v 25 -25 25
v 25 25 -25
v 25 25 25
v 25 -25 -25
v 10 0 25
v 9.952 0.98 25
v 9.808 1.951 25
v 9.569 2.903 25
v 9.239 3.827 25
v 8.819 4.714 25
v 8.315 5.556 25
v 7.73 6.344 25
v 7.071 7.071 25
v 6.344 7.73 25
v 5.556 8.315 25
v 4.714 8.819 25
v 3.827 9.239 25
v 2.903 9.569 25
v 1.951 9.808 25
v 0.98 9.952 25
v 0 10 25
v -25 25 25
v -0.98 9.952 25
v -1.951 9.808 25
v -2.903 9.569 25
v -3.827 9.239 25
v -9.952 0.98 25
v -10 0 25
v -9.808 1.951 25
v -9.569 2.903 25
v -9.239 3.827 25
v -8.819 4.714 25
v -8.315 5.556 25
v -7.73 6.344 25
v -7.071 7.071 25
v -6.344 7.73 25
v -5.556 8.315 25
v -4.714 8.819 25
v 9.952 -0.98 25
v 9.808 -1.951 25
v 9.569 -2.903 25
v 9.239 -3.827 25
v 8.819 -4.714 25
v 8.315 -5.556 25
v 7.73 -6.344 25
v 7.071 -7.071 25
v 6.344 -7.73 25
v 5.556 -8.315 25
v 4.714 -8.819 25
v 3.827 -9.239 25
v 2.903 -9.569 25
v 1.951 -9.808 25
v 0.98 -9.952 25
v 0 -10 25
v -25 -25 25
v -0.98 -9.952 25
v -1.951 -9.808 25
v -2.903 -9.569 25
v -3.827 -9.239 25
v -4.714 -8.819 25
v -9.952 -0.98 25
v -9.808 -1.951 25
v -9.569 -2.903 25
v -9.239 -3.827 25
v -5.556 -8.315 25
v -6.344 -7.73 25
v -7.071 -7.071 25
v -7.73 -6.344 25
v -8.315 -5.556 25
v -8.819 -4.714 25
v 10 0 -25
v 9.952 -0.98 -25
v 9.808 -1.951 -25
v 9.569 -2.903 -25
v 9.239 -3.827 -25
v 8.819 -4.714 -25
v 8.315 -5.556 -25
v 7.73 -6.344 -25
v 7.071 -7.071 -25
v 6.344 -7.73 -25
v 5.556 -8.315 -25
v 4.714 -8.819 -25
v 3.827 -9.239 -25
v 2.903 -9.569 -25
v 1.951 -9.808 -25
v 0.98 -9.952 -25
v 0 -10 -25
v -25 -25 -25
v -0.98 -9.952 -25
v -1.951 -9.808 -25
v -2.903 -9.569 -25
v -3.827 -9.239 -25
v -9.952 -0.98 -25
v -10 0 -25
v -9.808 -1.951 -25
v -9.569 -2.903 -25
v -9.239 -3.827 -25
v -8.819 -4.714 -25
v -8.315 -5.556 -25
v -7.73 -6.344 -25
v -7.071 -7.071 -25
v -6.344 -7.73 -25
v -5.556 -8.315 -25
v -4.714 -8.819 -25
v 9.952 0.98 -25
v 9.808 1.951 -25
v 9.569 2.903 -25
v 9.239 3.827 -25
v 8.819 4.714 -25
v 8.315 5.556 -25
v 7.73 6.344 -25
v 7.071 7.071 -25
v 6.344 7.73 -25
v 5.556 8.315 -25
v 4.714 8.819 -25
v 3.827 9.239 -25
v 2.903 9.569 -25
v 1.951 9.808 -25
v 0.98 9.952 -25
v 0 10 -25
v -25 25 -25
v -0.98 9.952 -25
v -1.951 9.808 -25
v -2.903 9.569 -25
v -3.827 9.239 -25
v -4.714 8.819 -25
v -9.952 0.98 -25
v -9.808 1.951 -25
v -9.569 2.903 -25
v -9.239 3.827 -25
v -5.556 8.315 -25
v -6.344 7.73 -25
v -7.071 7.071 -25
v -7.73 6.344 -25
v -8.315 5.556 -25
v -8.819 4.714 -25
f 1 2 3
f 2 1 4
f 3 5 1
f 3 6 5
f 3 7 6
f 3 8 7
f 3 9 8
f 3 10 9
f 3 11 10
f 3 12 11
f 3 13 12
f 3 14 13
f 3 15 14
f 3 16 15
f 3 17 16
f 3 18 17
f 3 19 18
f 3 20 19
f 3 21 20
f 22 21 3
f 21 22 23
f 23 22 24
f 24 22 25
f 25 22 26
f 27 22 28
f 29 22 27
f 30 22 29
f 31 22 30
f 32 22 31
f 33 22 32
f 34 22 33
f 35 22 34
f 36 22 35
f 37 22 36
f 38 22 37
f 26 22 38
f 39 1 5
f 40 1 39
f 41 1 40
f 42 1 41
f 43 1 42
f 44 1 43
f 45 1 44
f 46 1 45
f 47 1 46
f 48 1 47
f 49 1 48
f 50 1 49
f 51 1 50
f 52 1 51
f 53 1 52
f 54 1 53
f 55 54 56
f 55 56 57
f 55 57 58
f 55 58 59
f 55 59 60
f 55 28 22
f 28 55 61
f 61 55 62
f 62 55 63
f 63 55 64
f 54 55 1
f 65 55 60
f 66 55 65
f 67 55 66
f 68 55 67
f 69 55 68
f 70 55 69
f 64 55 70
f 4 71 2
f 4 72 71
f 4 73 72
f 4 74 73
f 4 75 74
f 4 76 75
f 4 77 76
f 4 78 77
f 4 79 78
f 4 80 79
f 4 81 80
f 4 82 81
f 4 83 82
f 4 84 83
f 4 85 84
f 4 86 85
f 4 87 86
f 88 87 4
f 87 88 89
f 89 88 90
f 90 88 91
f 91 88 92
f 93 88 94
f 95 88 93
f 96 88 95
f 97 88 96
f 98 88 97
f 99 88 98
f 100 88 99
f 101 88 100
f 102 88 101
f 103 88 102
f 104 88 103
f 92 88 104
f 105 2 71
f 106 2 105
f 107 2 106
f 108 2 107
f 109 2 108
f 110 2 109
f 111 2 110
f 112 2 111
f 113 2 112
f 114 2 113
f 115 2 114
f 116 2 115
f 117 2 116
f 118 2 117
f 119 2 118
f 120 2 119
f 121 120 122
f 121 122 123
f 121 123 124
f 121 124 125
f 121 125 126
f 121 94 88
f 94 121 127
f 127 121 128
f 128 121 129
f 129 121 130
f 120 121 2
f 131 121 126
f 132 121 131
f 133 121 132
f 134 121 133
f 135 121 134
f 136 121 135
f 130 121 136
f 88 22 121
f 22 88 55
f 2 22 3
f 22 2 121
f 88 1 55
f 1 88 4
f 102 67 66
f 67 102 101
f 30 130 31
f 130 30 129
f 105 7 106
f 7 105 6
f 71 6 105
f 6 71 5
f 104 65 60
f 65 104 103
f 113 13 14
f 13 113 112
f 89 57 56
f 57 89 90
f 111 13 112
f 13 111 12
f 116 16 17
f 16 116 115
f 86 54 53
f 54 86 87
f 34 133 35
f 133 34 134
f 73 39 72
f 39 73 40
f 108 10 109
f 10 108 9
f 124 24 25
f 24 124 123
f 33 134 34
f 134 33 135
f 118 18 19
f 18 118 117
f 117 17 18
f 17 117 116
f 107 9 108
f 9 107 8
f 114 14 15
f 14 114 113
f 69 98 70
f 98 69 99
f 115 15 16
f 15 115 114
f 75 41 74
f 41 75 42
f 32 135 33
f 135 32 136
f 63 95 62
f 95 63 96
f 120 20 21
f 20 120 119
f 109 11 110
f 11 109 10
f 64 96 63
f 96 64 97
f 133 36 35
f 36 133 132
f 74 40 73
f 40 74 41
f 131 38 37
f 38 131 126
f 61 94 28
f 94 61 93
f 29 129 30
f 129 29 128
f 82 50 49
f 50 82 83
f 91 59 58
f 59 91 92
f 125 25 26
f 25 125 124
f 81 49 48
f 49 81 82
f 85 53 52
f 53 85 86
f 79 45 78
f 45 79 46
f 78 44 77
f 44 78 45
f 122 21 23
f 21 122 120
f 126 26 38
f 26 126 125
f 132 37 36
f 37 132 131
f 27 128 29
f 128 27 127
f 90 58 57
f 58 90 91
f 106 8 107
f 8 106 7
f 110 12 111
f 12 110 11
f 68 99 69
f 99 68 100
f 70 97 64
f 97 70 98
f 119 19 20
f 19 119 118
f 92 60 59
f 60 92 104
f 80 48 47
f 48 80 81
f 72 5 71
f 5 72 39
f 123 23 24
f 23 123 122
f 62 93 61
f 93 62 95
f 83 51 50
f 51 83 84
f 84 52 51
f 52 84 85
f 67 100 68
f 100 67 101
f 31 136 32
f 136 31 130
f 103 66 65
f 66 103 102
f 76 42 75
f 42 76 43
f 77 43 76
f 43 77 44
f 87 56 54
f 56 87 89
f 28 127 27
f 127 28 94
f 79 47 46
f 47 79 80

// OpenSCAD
difference() {
    cube([50, 50, 50], center = true);
    cylinder(h = 100, r = 10, center = true, $fn = 64);
}
